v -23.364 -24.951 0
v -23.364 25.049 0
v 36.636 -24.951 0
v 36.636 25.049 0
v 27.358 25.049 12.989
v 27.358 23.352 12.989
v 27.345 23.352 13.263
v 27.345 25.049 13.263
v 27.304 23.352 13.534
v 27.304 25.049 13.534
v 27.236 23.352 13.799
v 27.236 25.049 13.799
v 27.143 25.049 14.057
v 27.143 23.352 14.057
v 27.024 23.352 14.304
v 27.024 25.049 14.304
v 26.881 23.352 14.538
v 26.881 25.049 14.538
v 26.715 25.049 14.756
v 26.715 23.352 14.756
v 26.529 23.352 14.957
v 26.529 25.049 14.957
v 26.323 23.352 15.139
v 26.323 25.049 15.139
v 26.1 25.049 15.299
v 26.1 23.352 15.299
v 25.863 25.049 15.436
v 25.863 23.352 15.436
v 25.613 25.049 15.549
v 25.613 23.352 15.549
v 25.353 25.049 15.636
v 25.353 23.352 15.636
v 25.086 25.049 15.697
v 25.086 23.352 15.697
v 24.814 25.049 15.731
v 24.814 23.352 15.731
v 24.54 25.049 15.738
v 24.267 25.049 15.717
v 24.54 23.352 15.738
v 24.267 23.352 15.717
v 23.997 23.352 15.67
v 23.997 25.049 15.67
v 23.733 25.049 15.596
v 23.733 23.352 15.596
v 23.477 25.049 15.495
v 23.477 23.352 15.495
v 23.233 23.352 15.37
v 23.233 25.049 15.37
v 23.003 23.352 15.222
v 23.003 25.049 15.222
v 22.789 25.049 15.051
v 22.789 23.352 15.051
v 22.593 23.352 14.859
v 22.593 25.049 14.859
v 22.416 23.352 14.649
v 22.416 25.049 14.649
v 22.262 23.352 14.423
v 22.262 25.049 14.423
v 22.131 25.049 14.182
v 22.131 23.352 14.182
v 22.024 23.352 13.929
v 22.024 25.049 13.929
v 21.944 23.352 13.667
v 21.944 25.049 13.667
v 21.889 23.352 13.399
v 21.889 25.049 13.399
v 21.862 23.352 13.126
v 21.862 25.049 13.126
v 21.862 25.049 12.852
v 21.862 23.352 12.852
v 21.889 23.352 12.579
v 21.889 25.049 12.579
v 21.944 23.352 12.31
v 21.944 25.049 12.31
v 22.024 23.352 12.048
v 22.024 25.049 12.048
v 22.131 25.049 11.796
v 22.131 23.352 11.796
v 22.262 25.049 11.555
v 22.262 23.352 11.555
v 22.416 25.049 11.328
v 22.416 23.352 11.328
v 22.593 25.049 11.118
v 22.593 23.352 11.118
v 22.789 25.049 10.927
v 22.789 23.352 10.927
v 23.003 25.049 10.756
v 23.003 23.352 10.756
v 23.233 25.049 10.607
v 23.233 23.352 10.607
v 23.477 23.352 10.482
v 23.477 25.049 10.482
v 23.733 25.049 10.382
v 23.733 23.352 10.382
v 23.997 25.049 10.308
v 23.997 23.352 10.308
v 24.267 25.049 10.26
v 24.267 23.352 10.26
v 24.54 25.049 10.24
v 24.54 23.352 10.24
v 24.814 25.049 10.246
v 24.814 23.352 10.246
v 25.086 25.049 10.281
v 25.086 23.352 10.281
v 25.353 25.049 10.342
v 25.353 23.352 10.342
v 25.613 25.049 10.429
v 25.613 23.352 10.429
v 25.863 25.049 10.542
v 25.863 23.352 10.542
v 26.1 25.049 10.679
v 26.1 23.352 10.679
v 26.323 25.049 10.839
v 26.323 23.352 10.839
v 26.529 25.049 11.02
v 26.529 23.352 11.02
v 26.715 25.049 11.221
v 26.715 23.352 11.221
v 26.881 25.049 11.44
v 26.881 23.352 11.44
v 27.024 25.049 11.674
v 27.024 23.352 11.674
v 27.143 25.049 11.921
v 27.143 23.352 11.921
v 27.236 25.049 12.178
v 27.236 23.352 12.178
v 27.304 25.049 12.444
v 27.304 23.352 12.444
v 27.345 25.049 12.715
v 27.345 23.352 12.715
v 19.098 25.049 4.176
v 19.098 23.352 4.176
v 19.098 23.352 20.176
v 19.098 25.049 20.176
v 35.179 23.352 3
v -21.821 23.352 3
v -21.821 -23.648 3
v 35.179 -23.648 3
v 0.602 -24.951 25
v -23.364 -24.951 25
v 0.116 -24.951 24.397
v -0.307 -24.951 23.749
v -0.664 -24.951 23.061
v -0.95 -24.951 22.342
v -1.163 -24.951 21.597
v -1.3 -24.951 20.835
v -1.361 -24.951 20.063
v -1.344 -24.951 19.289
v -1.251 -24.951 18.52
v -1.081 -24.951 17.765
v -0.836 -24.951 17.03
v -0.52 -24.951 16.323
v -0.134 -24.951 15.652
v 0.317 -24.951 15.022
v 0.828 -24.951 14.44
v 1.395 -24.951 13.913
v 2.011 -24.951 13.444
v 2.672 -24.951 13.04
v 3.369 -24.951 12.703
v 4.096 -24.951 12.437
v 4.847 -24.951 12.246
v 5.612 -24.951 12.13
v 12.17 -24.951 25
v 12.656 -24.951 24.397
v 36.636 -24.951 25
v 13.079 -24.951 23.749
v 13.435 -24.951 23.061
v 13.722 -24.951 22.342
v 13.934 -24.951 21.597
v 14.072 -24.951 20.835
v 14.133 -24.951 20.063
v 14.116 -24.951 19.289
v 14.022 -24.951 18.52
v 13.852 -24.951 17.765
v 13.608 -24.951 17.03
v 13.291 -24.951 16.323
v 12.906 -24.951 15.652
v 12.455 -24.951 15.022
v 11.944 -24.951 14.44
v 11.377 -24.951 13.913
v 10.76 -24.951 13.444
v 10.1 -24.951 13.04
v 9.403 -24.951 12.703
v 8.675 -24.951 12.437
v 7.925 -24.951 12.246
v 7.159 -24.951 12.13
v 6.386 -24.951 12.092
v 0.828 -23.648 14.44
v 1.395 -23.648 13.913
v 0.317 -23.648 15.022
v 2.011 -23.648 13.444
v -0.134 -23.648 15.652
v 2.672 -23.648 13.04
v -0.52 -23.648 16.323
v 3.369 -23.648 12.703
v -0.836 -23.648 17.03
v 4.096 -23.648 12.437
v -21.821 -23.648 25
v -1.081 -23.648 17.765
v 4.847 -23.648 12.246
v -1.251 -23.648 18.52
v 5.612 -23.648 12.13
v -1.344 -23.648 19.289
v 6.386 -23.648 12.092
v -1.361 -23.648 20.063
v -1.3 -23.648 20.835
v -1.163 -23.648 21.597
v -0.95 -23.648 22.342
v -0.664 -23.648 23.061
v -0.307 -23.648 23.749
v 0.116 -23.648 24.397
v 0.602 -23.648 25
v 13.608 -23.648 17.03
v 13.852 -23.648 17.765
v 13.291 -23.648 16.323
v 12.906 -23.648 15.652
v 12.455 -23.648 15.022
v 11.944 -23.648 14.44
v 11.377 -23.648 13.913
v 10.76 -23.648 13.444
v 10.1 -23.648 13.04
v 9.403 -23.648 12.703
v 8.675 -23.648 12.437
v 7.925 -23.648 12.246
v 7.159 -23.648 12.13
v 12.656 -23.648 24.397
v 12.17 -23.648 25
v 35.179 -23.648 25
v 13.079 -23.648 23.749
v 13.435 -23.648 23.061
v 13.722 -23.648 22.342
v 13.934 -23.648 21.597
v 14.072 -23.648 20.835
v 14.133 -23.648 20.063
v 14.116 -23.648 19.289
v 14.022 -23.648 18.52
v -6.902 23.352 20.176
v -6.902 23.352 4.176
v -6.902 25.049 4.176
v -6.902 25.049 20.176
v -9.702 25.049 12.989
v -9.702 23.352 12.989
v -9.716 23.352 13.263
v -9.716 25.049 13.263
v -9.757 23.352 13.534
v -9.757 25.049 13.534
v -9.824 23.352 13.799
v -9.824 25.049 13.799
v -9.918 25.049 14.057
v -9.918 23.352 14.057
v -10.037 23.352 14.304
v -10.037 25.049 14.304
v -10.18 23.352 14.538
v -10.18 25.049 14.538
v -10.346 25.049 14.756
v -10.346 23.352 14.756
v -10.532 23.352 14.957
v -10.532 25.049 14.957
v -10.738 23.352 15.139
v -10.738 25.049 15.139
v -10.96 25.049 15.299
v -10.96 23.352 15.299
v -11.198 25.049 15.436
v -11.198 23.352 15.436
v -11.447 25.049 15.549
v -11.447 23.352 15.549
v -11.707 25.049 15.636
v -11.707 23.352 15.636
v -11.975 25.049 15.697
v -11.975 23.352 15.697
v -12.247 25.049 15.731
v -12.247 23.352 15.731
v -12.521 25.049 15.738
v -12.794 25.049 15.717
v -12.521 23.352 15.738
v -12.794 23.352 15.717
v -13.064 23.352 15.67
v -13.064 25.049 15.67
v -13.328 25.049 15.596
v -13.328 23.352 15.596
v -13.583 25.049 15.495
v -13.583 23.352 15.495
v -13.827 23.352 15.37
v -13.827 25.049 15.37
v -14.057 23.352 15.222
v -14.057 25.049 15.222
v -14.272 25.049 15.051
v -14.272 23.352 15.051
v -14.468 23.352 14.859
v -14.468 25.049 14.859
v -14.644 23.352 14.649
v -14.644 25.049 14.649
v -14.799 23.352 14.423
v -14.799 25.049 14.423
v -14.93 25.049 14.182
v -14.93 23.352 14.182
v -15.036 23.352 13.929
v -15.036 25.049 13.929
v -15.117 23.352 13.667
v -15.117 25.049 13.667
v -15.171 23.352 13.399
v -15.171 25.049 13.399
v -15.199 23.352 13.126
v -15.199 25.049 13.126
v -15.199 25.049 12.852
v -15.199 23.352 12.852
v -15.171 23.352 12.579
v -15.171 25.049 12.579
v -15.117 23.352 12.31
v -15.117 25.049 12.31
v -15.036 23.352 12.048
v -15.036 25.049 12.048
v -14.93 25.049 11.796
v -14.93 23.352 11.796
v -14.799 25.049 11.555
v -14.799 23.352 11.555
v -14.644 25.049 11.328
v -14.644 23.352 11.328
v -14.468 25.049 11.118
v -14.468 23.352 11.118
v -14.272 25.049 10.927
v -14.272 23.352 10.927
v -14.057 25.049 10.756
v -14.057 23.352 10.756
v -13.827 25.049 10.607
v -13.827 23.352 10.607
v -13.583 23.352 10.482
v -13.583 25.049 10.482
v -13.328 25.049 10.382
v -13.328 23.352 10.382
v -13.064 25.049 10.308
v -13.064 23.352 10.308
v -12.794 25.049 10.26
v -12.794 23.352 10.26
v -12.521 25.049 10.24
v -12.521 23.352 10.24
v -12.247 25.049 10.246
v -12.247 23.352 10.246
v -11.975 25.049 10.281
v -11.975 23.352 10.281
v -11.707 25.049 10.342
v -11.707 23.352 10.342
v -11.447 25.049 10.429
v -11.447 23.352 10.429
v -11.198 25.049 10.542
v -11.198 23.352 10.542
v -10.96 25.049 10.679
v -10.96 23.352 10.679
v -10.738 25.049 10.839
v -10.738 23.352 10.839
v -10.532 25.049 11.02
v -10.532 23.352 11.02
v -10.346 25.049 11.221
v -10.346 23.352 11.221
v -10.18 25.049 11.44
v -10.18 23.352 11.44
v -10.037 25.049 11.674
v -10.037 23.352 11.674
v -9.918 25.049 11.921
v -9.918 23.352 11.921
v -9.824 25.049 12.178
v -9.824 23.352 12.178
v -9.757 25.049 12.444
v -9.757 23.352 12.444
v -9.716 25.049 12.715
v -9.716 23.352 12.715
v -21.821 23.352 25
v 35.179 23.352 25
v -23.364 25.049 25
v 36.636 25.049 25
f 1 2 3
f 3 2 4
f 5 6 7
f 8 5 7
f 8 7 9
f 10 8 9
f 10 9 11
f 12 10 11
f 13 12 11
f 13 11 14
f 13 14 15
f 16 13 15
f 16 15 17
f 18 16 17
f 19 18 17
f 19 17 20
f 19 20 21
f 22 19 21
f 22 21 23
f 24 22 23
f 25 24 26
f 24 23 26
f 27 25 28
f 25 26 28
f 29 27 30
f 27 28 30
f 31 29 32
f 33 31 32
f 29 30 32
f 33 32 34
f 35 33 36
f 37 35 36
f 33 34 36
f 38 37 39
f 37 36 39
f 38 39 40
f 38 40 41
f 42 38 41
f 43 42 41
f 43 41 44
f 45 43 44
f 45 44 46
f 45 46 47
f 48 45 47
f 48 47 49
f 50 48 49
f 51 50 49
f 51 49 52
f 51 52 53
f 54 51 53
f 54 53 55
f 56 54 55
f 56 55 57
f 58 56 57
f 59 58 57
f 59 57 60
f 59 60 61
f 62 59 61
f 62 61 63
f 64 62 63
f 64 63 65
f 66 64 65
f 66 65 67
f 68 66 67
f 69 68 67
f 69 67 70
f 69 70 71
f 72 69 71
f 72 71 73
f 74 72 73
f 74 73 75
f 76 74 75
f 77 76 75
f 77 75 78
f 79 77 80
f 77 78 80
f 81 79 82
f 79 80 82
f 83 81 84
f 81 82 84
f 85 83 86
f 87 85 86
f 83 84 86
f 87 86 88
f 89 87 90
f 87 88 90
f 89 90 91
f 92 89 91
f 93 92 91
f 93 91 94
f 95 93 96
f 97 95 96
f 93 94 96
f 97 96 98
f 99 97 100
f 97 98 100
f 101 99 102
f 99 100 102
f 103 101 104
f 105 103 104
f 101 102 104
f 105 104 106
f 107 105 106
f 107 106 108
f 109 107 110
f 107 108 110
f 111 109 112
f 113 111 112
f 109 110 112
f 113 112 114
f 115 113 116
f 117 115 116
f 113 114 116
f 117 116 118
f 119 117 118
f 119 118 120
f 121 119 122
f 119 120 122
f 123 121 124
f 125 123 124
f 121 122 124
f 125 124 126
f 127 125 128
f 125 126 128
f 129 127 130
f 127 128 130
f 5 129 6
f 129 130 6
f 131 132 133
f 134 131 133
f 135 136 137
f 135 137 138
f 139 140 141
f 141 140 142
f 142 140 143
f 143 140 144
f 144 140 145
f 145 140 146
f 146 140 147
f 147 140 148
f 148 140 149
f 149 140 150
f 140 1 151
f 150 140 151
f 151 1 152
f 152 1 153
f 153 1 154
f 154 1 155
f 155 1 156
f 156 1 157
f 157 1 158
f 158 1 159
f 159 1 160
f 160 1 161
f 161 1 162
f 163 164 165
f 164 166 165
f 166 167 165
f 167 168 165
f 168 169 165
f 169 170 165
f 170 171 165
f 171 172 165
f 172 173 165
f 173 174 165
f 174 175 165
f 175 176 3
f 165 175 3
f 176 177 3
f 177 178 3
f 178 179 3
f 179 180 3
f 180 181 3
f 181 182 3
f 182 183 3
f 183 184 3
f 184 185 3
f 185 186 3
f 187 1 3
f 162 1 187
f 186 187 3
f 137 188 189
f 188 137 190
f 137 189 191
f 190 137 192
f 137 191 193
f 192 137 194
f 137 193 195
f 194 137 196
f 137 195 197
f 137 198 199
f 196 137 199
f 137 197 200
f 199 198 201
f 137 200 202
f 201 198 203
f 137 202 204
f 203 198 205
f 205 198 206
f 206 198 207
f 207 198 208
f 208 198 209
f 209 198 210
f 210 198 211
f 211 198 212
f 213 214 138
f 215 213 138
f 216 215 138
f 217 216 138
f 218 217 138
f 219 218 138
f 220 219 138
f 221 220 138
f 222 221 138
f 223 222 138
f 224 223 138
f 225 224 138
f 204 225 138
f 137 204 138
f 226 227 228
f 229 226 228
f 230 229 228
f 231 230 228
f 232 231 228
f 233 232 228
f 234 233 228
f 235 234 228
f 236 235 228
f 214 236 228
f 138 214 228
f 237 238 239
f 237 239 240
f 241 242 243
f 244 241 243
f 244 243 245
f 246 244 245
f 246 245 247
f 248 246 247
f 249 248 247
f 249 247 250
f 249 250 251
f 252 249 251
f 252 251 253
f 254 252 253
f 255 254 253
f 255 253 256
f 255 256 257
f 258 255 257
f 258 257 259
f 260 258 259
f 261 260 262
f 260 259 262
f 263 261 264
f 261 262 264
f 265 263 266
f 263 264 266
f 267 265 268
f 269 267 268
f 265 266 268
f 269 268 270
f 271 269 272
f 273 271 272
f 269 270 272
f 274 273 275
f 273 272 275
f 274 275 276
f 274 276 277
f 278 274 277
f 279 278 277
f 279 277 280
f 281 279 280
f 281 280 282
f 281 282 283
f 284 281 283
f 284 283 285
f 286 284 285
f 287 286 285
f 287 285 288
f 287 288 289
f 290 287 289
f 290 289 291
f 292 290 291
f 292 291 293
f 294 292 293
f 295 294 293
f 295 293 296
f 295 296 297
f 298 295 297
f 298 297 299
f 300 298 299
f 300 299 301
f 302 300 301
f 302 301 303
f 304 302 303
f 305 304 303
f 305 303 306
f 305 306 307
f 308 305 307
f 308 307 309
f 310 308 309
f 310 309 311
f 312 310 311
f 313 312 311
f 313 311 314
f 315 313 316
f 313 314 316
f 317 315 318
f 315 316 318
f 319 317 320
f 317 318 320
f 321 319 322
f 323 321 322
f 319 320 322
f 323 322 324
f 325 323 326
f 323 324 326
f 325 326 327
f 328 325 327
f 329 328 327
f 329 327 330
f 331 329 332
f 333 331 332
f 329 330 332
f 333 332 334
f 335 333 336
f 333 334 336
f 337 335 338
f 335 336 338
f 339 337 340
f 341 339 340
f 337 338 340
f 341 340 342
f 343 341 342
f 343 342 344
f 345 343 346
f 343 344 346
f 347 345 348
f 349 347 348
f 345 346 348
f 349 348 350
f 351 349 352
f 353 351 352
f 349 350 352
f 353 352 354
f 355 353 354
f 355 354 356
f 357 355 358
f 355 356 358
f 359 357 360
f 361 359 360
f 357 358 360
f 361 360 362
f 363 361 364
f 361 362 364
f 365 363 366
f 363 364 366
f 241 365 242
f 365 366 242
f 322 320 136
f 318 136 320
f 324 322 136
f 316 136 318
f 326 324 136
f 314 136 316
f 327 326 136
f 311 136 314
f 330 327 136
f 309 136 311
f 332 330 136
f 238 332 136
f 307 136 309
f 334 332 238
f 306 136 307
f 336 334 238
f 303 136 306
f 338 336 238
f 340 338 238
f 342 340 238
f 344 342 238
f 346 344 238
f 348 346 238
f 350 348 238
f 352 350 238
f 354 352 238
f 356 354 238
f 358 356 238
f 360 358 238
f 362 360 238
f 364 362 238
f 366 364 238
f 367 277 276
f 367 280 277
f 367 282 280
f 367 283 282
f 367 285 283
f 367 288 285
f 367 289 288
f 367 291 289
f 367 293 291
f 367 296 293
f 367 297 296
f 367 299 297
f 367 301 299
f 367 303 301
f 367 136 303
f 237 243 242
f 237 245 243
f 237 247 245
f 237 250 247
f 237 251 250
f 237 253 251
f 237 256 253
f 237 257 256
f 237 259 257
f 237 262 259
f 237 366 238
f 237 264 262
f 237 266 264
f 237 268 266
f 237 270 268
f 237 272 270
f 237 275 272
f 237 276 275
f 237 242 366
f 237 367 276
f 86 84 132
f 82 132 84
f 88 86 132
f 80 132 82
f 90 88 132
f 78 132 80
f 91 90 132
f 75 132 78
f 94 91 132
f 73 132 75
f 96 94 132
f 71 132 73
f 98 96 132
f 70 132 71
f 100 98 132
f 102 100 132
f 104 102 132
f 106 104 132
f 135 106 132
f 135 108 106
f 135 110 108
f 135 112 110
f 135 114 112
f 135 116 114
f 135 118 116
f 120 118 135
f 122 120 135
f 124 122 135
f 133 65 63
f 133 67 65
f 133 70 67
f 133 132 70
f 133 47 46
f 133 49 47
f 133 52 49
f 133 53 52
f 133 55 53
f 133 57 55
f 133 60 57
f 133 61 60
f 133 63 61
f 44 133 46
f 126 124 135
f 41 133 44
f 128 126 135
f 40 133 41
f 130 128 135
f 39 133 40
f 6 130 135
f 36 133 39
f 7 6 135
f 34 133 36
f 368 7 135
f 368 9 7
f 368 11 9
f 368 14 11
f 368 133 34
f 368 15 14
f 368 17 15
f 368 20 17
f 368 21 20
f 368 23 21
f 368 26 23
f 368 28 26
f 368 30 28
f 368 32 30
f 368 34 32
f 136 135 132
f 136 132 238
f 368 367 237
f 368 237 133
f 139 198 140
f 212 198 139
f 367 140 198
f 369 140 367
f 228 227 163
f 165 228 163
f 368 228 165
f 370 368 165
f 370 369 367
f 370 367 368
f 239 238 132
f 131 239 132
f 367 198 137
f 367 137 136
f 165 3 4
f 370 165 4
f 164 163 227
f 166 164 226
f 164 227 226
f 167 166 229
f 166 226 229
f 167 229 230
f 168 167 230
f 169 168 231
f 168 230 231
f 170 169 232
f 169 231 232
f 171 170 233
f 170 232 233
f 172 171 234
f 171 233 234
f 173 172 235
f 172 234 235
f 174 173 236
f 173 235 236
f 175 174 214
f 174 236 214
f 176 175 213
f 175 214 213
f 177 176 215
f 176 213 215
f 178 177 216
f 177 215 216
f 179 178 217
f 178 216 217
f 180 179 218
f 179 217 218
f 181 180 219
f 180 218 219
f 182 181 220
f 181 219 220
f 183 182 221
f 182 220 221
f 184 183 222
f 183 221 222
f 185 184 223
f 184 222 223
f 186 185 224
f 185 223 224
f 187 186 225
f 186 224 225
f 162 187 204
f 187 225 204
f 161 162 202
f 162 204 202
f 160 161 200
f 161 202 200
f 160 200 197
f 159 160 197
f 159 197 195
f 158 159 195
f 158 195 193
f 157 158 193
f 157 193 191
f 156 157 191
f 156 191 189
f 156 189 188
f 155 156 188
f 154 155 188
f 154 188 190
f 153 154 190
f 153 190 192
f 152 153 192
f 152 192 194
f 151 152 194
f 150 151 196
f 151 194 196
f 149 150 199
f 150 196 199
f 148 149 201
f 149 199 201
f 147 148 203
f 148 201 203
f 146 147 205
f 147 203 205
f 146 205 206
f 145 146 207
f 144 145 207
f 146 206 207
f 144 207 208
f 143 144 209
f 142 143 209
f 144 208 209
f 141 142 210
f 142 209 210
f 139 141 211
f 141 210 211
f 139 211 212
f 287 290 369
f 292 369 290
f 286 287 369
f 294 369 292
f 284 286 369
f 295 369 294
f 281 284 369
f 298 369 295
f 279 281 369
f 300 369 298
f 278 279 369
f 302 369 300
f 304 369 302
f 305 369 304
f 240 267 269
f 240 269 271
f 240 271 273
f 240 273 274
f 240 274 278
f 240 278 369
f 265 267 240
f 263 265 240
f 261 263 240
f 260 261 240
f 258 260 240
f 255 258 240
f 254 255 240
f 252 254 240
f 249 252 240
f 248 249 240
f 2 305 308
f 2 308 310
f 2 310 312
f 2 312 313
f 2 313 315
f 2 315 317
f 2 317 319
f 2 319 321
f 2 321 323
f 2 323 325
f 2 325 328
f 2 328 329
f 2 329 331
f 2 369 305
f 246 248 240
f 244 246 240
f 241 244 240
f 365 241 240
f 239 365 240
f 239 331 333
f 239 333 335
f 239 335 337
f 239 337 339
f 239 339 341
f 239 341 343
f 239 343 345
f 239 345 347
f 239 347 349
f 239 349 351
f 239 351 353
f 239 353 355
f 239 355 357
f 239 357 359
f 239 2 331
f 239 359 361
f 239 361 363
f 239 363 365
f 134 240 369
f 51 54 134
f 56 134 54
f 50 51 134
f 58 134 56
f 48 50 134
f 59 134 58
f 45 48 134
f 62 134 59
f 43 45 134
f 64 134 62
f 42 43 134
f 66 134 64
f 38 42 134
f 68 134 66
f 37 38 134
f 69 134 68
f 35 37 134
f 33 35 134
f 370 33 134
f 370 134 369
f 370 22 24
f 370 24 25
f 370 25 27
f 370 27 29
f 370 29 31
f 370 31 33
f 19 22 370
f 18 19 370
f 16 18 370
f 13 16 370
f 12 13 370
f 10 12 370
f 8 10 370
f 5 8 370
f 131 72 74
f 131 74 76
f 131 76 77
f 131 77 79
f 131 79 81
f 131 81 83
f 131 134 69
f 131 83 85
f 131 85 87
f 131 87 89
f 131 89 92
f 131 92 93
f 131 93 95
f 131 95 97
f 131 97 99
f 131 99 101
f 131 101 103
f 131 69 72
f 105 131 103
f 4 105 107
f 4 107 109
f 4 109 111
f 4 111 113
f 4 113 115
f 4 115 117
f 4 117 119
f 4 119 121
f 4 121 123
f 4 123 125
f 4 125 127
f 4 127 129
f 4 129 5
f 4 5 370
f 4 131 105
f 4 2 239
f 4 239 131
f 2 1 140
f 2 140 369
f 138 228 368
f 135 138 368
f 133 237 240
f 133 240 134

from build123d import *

# Parameters (mm, degrees)
F0_W      = 60
F0_H      = 50
F1_DEPTH  = 25
F2_W      = 57
F2_H      = 47
F3_DEPTH  = 22
F4_W      = 26
F4_H      = 16
F5_DEPTH  = 1.6986841711
F7_D      = 5.5
F7_DEPTH  = 1.6986841711
F8_D      = 5.5
F8_DEPTH  = 1.6986841711
F10_D     = 15.5
F10_DEPTH = 1.3033158289


with BuildPart() as f1:
    # F0 (on Top) → F1 (new body)
    with BuildSketch(Plane.XY):
        with Locations((6.6355607659, 0.0492307718)):
            Rectangle(F0_W, F0_H)
    extrude(amount=F1_DEPTH)

    # F2 (on face) → F3 (cut)
    with BuildSketch(Plane.XY.offset(25)):
        with Locations((6.679061912, -0.1484533993)):
            Rectangle(F2_W, F2_H)
    extrude(amount=-F3_DEPTH, mode=Mode.SUBTRACT)

    # F4 (on face) → F5 (cut, through all)
    with BuildSketch(Plane.XZ.offset(-23.3515466007)):
        with Locations((6.098437123, 12.1760265902)):
            Rectangle(F4_W, F4_H)
    extrude(amount=-F5_DEPTH, mode=Mode.SUBTRACT)

    # F7 (through all, one way)
    with BuildSketch(Plane.XZ.offset(-23.3515466007)):
        with Locations((-12.4521832913, 12.988736853)):
            Circle(F7_D / 2)
    extrude(amount=-F7_DEPTH, mode=Mode.SUBTRACT)

    # F8 (through all, one way)
    with BuildSketch(Plane.XZ.offset(-23.3515466007)):
        with Locations((24.6084798127, 12.988736853)):
            Circle(F8_D / 2)
    extrude(amount=-F8_DEPTH, mode=Mode.SUBTRACT)

    # F10 (through all, one way)
    with BuildSketch(Plane(origin=(0, -23.6484533993, 0), x_dir=(-1, 0, 0), z_dir=(0, 1, 0))):
        with Locations((-6.3858297653, 19.8415778577)):
            Circle(F10_D / 2)
    extrude(amount=-F10_DEPTH, mode=Mode.SUBTRACT)


solid = f1.part
